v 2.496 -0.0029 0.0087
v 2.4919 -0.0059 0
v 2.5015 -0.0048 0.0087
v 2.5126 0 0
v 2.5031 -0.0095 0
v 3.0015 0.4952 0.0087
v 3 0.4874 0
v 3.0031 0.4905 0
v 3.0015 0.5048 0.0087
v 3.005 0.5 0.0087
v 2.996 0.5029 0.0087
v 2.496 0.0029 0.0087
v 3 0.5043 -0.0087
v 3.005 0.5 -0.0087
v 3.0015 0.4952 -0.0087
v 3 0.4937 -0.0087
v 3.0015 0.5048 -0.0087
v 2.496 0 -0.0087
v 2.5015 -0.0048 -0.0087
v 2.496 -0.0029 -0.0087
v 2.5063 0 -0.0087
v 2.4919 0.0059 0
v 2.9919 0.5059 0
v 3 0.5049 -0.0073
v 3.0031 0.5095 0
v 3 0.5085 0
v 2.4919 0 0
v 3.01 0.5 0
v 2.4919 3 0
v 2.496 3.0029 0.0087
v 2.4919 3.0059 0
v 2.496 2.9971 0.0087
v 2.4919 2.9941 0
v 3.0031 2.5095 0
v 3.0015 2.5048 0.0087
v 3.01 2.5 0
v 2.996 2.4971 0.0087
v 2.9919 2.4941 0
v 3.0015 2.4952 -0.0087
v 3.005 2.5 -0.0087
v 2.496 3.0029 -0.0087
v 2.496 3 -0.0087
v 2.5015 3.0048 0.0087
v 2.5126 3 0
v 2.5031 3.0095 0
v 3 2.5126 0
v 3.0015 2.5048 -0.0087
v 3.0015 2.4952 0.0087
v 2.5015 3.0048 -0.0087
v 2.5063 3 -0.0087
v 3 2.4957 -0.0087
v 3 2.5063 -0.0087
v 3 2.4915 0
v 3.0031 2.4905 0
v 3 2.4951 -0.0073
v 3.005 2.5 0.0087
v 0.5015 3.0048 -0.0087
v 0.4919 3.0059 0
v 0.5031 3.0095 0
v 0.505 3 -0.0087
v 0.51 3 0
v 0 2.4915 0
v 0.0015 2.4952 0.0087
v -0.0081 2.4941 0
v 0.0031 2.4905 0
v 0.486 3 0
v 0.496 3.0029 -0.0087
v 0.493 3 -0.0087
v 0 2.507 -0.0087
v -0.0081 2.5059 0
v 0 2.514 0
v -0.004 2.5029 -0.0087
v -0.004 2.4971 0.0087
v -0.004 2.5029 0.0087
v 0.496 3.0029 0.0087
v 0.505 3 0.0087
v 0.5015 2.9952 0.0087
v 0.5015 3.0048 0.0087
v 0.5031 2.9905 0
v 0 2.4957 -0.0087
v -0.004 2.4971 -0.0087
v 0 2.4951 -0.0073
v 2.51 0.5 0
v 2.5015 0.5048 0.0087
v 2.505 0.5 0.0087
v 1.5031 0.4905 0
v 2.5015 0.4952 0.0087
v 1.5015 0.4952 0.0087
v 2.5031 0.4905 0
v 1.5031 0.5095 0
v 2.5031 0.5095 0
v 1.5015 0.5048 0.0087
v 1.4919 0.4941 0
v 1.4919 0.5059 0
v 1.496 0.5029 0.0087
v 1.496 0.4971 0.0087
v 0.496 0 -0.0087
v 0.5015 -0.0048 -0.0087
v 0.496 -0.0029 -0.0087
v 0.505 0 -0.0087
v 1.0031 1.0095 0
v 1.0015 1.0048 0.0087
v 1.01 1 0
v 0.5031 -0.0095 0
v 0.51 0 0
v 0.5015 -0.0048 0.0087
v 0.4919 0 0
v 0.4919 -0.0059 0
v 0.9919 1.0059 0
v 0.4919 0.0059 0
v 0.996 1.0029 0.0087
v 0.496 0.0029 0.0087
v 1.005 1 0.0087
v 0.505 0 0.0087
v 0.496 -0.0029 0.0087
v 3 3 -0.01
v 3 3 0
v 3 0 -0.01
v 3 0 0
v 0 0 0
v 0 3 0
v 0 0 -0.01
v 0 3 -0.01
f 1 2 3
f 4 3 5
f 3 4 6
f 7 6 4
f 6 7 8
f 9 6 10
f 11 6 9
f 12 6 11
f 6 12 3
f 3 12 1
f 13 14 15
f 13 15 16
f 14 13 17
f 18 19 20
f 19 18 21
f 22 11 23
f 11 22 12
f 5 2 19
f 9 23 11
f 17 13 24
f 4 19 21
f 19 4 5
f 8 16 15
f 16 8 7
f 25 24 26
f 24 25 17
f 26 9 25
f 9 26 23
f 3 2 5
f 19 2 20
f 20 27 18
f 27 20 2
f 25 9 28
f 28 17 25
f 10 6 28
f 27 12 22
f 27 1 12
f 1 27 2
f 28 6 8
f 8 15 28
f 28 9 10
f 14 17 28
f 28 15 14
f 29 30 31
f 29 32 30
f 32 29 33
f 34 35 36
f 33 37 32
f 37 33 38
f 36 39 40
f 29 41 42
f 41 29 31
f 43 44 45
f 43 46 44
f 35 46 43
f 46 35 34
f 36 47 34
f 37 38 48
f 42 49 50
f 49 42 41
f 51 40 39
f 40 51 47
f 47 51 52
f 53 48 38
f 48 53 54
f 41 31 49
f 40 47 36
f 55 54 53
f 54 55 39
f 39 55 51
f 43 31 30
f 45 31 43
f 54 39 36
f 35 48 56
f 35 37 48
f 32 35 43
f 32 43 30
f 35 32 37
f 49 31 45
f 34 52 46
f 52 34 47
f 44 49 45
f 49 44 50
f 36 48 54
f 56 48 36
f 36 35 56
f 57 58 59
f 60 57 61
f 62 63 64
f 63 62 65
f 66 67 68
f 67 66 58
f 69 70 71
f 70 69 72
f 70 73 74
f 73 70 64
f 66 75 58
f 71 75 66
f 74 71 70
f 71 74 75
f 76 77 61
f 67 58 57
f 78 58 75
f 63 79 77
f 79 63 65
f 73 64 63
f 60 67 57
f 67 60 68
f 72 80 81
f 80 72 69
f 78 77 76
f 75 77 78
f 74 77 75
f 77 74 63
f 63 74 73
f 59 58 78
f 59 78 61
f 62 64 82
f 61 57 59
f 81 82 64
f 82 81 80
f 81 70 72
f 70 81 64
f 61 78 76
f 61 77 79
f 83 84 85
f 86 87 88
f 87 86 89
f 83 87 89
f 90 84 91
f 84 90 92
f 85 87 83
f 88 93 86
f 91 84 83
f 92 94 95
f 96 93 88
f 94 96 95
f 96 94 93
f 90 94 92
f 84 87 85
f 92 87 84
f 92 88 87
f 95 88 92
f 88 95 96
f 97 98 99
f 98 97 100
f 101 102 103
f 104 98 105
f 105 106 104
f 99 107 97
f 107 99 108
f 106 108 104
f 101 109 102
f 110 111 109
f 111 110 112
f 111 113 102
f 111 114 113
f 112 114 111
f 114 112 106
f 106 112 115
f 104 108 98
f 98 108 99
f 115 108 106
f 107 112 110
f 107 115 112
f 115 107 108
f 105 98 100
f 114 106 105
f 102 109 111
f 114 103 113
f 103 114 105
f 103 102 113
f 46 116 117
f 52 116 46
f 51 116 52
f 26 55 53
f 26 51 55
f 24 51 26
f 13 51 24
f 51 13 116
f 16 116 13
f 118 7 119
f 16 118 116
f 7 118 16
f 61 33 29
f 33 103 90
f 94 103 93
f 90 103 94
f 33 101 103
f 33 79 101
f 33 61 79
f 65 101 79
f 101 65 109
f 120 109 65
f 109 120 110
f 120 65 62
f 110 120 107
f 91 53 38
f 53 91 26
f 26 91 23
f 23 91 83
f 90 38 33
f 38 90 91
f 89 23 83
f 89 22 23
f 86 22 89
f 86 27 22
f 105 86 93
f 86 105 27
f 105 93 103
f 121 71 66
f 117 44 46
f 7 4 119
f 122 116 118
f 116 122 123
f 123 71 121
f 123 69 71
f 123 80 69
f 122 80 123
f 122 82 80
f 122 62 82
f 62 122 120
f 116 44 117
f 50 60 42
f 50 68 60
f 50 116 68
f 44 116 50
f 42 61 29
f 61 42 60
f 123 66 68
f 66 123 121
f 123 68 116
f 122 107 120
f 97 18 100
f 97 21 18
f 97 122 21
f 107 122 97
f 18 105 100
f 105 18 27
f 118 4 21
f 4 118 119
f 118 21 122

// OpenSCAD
hull(){
    translate([2.5, 0]) sphere(0.01);
    translate([3, 0.5]) sphere(0.01);
}
hull(){
    translate([3, 2.5]) sphere(0.01);
    translate([2.5, 3]) sphere(0.01);
}
hull(){
    translate([0.5, 3]) sphere(0.01);
    translate([0, 2.5]) sphere(0.01);
}
hull(){
    translate([2.5, 0.5]) sphere(0.01);
    translate([1.5, 0.5]) sphere(0.01);
}
hull(){
    translate([1, 1]) sphere(0.01);
    translate([0.5, 0]) sphere(0.01);
}
translate([0,0,-0.01]) color([0.1,0.1,0.1]) cube([3,3,0.01]);
